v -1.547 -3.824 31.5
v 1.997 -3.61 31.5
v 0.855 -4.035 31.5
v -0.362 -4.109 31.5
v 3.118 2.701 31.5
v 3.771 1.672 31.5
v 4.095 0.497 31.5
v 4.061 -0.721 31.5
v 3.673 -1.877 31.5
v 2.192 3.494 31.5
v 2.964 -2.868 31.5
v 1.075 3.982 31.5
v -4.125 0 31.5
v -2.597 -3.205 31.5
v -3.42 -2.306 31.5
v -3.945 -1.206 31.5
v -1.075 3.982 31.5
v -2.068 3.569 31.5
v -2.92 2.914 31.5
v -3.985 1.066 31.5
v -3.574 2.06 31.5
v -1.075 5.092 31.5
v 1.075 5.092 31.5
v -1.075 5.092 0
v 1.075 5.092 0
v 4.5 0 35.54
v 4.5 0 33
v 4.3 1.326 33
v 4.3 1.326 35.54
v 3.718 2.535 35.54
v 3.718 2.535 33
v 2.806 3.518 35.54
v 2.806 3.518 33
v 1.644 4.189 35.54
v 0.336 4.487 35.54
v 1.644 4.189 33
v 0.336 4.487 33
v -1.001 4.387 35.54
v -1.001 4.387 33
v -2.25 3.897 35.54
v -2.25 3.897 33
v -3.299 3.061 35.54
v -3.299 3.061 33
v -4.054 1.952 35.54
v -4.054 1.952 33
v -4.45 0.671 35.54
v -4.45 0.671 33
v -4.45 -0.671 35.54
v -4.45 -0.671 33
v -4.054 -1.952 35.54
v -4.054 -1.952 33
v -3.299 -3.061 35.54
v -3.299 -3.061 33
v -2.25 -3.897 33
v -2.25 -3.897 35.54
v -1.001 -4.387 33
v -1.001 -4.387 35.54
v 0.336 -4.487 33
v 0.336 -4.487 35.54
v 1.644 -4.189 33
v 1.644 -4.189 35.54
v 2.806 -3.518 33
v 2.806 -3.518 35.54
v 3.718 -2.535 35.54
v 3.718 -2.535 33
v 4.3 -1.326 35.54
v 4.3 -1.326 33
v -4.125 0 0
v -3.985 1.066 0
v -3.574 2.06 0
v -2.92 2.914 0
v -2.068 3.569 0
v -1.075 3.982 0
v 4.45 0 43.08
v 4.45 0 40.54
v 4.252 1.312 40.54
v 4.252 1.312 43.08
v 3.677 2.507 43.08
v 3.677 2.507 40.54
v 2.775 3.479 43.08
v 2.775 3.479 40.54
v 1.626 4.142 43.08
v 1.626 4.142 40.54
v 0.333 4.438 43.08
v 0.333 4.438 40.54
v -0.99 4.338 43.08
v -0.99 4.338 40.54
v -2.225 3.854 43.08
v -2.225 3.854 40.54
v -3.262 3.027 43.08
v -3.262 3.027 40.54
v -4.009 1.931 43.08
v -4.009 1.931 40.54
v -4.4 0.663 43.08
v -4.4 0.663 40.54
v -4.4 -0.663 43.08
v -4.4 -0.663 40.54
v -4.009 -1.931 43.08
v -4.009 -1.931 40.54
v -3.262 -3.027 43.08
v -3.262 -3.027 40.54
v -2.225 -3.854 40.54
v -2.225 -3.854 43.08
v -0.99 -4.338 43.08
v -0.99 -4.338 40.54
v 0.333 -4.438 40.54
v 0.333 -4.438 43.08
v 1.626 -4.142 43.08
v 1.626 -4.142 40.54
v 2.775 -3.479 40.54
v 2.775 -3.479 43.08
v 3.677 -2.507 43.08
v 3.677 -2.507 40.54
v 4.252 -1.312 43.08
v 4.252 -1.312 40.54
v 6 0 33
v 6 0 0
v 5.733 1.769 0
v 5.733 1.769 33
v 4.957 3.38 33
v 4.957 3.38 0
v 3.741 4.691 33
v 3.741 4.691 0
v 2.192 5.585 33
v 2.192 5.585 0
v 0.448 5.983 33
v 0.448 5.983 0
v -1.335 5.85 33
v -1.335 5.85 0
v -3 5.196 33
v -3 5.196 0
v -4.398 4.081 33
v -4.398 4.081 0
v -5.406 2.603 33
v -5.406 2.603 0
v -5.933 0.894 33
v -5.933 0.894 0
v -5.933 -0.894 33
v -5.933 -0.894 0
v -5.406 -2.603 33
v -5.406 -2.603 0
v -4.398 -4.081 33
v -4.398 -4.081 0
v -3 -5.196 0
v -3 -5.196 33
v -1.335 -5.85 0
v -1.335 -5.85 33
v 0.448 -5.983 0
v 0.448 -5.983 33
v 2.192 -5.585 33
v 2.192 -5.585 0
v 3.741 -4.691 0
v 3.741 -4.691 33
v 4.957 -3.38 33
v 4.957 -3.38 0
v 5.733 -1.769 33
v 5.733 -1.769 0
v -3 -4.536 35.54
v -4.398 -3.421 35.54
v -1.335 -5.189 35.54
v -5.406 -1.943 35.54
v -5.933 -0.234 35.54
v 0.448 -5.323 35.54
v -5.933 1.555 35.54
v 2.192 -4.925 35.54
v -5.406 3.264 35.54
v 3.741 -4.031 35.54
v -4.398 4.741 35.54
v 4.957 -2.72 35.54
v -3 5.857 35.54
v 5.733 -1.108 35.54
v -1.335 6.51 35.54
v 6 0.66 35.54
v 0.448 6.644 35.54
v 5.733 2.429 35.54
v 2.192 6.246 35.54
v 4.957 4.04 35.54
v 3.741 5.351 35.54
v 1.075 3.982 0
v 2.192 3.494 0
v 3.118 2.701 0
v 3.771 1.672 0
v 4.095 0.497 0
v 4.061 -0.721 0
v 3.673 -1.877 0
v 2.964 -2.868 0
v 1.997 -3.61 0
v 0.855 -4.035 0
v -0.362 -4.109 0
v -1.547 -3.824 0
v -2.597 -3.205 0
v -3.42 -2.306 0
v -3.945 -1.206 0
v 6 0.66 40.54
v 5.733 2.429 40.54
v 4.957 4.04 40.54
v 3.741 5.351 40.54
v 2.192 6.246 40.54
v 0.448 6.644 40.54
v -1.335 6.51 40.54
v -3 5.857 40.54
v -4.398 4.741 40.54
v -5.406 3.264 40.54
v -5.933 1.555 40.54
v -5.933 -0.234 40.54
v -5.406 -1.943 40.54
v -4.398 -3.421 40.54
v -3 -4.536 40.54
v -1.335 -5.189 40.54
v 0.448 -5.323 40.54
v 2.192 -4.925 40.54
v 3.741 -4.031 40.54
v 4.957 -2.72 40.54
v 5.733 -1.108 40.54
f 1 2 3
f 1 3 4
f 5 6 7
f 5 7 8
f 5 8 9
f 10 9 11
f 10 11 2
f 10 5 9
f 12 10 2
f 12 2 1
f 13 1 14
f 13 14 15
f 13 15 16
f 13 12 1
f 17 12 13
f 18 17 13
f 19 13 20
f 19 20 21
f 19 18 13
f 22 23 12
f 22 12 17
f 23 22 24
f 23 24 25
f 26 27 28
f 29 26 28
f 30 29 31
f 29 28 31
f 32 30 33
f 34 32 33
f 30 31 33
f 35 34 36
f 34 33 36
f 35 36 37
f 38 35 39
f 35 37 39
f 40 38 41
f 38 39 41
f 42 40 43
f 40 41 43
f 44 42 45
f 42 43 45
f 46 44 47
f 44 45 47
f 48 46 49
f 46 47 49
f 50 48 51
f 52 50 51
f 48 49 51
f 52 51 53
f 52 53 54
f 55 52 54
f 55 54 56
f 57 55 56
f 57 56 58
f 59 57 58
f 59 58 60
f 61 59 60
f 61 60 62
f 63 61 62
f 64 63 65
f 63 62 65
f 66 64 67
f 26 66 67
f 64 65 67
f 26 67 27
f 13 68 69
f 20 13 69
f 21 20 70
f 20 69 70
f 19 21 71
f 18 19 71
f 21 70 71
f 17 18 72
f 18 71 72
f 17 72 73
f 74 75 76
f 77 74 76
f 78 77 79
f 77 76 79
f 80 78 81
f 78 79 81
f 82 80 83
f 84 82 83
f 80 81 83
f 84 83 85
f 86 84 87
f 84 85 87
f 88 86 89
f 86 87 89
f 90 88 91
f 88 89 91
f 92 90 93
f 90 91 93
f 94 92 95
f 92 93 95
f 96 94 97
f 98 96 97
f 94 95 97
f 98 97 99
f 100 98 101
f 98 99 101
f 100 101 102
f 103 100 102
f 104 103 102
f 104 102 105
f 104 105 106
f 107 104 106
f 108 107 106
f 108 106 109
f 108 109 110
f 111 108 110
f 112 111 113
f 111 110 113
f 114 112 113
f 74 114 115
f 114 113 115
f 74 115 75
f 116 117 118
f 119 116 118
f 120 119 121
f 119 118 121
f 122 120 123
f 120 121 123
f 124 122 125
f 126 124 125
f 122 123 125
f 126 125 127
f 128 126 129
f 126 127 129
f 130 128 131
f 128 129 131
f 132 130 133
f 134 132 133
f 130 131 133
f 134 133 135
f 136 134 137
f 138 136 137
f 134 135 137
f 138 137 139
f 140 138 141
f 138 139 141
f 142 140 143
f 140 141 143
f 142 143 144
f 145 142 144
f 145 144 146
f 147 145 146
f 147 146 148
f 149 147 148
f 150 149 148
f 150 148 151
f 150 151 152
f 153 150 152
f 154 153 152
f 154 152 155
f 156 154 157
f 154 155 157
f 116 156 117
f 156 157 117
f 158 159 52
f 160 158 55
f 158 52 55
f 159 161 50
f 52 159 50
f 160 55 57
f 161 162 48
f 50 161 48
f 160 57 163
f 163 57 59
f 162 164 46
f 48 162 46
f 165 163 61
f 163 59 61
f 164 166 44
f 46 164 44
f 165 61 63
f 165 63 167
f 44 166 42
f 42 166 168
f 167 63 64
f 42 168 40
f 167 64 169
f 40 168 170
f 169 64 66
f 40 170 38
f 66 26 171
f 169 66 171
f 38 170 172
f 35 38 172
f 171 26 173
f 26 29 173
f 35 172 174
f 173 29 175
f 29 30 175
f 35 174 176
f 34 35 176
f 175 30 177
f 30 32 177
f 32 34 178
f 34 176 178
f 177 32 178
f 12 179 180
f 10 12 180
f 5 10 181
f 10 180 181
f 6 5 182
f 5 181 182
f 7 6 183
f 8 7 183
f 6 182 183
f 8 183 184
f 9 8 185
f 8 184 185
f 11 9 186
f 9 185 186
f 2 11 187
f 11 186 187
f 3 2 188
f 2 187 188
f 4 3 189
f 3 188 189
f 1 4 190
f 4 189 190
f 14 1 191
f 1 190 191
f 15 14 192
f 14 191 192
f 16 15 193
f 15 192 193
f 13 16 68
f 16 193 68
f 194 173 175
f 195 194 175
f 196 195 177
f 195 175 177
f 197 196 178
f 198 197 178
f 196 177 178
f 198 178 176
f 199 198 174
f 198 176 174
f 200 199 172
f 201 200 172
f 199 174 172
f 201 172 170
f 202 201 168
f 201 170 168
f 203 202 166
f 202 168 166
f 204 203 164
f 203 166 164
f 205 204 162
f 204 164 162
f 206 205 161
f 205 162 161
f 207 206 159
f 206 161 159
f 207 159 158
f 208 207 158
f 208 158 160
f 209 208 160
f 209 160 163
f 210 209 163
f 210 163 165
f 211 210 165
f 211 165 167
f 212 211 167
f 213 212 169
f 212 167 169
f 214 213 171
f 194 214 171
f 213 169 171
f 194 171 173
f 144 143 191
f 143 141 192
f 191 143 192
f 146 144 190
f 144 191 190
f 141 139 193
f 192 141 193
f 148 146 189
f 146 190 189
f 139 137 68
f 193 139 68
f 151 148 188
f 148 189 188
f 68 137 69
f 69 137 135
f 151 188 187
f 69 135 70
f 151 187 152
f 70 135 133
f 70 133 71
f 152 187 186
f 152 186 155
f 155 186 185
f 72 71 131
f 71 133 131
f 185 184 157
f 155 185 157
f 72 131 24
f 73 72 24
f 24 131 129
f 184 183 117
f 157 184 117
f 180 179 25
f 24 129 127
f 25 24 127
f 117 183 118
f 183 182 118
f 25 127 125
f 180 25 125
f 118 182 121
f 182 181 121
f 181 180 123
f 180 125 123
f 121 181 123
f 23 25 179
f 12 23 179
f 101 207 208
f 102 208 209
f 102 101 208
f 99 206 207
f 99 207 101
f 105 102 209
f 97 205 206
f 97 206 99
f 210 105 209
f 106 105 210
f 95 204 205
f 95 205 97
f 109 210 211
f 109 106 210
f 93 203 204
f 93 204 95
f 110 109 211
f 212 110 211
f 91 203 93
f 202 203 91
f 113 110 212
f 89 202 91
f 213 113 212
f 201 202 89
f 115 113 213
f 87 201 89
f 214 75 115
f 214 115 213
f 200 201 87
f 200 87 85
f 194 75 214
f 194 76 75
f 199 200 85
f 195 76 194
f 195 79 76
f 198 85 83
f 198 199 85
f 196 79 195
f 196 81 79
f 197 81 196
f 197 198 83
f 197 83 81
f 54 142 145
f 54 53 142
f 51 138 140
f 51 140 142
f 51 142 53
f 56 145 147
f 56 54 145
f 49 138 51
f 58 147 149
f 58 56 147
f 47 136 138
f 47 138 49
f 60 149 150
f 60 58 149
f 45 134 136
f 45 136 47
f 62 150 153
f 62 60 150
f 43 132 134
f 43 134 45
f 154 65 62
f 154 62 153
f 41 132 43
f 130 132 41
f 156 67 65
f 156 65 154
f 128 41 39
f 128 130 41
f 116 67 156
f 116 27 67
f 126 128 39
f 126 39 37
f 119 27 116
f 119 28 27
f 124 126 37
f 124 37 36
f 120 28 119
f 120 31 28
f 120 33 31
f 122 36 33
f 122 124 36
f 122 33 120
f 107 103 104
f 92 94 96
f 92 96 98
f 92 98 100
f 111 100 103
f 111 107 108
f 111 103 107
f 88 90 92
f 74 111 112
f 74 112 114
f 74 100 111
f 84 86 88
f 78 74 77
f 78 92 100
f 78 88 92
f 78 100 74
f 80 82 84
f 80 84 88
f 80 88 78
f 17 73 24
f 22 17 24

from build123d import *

# Parameters (mm, degrees)
SKETCH1_R           = 6
BOSS_EXTRUDE1_DEPTH = 33
SKETCH7_R           = 4.5
BOSS_EXTRUDE7_DEPTH = 2.54
SKETCH3_R           = 6
BOSS_EXTRUDE3_DEPTH = 5
SKETCH4_R           = 4.45
BOSS_EXTRUDE4_DEPTH = 2.54
CUT_EXTRUDE1_DEPTH  = 31.5


with BuildPart() as part:
    # Sketch1 → Boss-Extrude1 (new body)
    with BuildSketch(Plane.XY):
        Circle(SKETCH1_R)
    extrude(amount=BOSS_EXTRUDE1_DEPTH)

    # Sketch7 → Boss-Extrude7 (add)
    with BuildSketch(Plane.XY.offset(33)):
        Circle(SKETCH7_R)
    extrude(amount=BOSS_EXTRUDE7_DEPTH)

    # Sketch3 → Boss-Extrude3 (add)
    with BuildSketch(Plane.XY.offset(35.54)):
        with Locations((0, 0.6604)):
            Circle(SKETCH3_R)
    extrude(amount=BOSS_EXTRUDE3_DEPTH)

    # Sketch4 → Boss-Extrude4 (add)
    with BuildSketch(Plane.XY.offset(40.54)):
        Circle(SKETCH4_R)
    extrude(amount=BOSS_EXTRUDE4_DEPTH)

    # Sketch5 → Cut-Extrude1 (cut)
    with BuildSketch(Plane(origin=(0, 0, 0), x_dir=(-1, 0, 0), z_dir=(0, 0, -1))):
        with BuildLine():
            Line((-1.075, 5.09246155), (-1.075, 3.98246155))
            ThreePointArc((-1.075, 3.98246155), (0, 4.125), (1.075, 3.98246155))
            Line((1.075, 3.98246155), (1.075, 5.09246155))
            Line((1.075, 5.09246155), (-1.075, 5.09246155))
        make_face()
        with BuildLine():
            ThreePointArc((1.075, 3.98246155), (0, 4.125), (-1.075, 3.98246155))
            Line((-1.075, 3.98246155), (1.075, 3.98246155))
        make_face()
        with BuildLine():
            Line((1.075, 3.98246155), (-1.075, 3.98246155))
            ThreePointArc((-1.075, 3.98246155), (-2.50811184, -3.274904579), (4.125, 0))
            ThreePointArc((4.125, 0), (3.274904579, 2.50811184), (1.075, 3.98246155))
        make_face()
    extrude(amount=-CUT_EXTRUDE1_DEPTH, mode=Mode.SUBTRACT)


solid = part.part
